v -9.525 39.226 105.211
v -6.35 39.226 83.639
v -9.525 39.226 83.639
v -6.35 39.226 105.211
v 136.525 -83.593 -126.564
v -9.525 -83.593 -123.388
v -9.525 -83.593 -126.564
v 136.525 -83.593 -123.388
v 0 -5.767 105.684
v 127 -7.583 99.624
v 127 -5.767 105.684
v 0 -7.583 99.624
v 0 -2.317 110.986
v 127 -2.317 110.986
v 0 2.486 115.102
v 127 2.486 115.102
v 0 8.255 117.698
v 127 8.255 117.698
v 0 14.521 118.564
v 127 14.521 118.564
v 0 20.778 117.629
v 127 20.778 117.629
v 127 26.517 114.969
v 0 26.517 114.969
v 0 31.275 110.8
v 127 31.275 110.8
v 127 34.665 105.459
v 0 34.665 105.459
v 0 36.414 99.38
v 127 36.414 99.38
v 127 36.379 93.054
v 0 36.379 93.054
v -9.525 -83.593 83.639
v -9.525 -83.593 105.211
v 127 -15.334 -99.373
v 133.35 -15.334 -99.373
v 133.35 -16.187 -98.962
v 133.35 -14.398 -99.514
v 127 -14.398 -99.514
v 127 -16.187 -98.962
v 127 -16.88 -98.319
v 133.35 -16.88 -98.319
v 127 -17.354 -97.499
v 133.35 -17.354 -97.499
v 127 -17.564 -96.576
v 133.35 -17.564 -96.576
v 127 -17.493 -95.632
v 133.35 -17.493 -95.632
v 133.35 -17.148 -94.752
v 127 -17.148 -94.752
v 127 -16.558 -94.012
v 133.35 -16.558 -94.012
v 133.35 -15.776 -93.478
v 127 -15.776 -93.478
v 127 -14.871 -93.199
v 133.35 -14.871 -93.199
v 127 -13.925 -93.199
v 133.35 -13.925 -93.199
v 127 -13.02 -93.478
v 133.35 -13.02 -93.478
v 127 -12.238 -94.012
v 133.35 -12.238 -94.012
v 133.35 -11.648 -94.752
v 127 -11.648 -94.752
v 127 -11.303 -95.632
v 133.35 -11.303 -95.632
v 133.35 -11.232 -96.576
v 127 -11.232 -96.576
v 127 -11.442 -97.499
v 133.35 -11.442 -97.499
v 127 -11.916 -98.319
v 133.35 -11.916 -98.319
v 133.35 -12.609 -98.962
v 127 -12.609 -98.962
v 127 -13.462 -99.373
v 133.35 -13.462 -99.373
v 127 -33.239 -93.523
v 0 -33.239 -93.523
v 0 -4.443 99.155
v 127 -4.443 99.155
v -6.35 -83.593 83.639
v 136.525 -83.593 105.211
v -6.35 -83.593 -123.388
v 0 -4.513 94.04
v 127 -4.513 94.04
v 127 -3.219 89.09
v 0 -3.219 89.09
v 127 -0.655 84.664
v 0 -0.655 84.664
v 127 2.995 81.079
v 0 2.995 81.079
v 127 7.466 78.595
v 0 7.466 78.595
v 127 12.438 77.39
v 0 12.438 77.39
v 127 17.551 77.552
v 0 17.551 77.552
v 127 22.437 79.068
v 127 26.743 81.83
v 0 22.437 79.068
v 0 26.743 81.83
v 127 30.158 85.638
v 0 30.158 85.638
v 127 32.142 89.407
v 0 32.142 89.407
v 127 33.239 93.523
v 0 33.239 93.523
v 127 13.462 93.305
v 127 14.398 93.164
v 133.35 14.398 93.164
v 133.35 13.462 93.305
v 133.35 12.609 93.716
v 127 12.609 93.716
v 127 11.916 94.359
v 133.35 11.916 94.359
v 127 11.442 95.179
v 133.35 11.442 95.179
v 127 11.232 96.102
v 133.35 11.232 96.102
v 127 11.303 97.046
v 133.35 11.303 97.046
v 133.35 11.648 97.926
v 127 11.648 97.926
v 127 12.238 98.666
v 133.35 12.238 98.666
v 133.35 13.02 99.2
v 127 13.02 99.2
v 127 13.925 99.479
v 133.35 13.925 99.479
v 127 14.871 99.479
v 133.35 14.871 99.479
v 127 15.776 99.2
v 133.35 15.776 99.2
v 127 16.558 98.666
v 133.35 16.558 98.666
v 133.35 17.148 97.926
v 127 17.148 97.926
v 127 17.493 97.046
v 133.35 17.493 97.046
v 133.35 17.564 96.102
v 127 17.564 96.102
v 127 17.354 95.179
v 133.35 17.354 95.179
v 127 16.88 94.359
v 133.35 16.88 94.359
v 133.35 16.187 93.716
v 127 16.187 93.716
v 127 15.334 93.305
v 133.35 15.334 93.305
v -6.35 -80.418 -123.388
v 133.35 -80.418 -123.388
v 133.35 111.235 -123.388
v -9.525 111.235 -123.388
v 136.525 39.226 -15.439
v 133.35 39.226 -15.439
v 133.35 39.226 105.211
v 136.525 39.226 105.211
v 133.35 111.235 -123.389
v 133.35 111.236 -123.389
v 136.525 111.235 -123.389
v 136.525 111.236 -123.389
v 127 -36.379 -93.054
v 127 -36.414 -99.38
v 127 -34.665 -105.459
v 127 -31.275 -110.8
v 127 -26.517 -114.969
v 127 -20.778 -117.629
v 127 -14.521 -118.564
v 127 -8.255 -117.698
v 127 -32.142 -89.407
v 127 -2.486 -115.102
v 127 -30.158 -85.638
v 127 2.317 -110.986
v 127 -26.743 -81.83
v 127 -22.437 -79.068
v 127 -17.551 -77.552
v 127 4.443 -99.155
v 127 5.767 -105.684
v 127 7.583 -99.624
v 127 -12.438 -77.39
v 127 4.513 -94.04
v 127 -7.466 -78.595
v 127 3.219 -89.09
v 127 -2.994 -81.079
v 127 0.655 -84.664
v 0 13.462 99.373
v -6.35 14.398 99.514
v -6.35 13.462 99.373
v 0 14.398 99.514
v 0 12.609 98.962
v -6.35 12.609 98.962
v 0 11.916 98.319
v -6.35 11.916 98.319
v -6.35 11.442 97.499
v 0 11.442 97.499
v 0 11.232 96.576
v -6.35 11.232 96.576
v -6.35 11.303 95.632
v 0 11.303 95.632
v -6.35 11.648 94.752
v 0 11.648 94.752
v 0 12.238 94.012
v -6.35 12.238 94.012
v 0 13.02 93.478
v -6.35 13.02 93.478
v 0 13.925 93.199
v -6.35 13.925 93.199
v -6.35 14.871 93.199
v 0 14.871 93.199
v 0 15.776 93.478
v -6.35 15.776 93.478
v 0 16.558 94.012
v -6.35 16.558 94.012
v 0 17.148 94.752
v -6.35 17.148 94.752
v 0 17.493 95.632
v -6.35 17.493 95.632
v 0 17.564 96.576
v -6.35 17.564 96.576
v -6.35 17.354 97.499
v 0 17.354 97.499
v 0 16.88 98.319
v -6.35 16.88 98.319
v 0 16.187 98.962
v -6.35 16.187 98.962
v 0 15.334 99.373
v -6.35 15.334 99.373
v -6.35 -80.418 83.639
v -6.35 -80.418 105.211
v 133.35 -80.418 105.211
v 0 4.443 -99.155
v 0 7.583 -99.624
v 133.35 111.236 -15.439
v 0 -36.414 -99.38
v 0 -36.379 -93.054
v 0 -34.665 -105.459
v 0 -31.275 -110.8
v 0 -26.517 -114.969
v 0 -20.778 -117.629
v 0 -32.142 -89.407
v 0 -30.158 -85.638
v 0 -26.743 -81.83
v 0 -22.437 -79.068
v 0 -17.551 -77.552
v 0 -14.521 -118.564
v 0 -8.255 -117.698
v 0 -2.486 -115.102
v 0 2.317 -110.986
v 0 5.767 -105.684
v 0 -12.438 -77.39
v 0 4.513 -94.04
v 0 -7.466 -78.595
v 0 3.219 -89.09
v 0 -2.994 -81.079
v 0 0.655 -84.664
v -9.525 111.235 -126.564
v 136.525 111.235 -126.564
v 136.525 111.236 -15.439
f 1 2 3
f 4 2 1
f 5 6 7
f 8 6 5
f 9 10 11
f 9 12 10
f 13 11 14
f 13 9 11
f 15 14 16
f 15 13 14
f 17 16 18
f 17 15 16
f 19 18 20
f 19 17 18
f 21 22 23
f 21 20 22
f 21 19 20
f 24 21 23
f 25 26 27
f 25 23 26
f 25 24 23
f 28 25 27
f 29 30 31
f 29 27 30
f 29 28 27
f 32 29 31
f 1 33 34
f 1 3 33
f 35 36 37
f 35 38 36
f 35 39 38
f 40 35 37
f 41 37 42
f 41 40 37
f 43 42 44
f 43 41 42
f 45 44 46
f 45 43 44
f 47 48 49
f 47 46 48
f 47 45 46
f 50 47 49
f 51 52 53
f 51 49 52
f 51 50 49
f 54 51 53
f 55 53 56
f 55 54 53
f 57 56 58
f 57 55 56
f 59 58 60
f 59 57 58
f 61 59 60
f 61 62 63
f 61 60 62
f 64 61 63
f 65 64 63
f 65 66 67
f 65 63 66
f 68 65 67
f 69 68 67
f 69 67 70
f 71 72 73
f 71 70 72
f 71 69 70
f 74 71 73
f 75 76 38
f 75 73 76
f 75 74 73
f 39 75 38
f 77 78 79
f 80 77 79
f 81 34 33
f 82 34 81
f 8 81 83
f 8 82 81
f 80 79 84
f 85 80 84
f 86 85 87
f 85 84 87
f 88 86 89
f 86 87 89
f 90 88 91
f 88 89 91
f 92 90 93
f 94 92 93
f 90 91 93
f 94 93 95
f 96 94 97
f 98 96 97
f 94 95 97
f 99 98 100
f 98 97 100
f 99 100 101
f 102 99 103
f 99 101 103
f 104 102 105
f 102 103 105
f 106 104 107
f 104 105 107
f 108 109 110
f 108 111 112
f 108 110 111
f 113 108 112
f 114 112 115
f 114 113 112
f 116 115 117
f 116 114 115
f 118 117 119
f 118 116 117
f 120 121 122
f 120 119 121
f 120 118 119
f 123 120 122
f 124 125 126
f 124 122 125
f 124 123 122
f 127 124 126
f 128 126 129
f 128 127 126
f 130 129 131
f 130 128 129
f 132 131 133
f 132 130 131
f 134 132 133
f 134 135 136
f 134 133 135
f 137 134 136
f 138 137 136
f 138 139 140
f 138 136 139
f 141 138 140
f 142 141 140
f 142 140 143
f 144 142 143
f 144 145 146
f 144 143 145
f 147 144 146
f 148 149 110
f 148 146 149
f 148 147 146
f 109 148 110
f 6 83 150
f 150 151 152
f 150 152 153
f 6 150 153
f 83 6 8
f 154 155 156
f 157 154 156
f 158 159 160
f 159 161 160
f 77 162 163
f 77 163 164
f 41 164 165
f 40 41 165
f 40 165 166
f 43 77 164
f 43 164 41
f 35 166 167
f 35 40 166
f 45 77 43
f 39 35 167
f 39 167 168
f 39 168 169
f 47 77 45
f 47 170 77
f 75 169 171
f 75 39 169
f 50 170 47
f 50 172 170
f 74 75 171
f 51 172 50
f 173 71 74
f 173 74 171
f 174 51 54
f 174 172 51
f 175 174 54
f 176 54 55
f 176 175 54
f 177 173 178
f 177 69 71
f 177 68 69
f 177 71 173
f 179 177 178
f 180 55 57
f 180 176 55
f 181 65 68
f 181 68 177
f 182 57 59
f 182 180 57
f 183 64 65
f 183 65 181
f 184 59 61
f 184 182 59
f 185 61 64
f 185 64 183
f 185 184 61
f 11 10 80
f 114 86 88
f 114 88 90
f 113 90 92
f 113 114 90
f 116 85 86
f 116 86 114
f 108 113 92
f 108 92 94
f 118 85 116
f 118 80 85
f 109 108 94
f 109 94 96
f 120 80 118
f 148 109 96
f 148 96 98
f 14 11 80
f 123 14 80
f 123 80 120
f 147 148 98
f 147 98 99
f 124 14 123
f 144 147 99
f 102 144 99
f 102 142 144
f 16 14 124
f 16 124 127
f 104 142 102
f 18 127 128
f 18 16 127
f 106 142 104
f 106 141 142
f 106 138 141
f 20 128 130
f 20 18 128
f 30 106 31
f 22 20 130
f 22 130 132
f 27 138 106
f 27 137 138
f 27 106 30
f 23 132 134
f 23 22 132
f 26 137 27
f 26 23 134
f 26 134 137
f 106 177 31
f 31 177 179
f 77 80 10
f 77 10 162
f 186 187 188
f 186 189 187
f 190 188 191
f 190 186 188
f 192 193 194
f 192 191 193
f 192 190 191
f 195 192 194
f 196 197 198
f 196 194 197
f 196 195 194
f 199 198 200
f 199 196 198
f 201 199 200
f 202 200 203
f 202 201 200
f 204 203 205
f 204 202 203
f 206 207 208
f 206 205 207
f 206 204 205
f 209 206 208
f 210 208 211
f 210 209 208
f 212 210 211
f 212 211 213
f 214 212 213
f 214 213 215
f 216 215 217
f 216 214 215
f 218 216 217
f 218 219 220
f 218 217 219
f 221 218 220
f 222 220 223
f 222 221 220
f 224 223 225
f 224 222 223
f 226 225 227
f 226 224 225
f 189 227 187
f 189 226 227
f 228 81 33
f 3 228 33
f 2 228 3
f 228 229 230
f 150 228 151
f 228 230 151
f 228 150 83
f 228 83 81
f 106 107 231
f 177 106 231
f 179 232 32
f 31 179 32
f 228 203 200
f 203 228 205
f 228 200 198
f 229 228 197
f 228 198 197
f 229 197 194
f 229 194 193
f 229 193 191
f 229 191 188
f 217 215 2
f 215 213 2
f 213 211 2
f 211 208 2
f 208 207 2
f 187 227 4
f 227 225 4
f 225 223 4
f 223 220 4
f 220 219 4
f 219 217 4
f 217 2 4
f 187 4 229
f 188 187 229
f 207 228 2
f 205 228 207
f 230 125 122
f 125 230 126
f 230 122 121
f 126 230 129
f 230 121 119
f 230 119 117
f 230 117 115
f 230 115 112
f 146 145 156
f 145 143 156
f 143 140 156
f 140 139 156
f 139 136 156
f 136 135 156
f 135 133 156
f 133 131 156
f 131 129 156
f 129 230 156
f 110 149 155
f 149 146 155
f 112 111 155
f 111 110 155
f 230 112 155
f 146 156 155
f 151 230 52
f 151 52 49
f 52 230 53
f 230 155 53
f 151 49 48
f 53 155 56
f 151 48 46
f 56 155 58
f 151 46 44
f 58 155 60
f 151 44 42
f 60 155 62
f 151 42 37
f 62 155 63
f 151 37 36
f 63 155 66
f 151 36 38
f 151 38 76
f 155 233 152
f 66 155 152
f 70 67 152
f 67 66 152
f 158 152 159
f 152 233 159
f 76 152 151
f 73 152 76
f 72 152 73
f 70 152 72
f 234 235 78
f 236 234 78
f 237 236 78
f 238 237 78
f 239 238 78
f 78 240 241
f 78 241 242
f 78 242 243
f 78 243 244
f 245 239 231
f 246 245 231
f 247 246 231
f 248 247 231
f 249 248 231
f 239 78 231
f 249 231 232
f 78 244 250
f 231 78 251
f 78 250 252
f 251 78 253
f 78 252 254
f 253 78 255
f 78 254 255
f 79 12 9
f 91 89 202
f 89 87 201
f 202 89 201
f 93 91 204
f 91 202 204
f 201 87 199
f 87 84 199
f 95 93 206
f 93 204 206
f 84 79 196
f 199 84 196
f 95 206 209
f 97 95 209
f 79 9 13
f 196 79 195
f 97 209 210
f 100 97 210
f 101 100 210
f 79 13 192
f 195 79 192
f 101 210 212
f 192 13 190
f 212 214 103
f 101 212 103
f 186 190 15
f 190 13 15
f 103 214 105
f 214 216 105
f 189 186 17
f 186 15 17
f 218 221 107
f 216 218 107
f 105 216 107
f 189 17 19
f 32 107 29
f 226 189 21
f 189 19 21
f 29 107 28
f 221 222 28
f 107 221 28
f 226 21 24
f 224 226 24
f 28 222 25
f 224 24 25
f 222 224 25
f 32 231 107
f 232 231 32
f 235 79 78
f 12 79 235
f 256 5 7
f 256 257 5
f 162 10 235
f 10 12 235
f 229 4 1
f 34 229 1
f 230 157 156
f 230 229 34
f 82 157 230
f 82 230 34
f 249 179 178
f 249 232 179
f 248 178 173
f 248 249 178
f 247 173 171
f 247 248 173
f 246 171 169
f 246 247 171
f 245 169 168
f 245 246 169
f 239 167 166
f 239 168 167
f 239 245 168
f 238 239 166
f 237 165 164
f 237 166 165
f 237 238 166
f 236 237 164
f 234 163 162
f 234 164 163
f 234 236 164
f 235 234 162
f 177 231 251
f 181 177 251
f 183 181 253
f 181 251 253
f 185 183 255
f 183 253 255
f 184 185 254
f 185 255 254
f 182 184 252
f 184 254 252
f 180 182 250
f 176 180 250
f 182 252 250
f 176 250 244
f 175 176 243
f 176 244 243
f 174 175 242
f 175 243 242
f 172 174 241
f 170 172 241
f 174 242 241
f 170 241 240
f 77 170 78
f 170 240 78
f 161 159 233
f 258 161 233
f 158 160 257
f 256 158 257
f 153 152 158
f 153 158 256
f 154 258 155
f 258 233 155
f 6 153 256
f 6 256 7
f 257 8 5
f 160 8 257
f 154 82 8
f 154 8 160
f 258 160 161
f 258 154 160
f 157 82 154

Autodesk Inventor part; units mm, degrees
ref_plane "YZ Plane" through (0, 0, 0) normal (1, 0, 0) x (0, 1, 0)
ref_plane "XZ Plane" through (0, 0, 0) normal (0, 1, 0) x (-1, 0, 0)
ref_plane "XY Plane" through (0, 0, 0) normal (0, 0, 1) x (1, 0, 0)
sketch "Sketch3" plane through (0, 0, 0) normal (1, 0, 0) x (0, 1, 0)
  line L0 (0, 0) -> (232.918, 0) construction
  line L1 (0, 0) -> (208.28, 0) construction
  line L2 (0, 0) -> (194.818, 0) construction
  line L3 (0, 0) -> (156.718, 0) construction
  line L4 (14.398, 96.339) -> (-14.398, -96.339) construction
  line L5 (-7.5829, 99.6241) -> (-36.3788, -93.054)
  line L6 (7.5829, -99.6241) -> (36.3788, 93.054)
  arc A0 (36.3788, 93.054) -> (-7.5829, 99.6241) centre (14.398, 96.339) ccw
  arc A1 (-36.3788, -93.054) -> (7.5829, -99.6241) centre (-14.398, -96.339) ccw
  line L7 (0, 0) -> (194.818, 0) construction
  line L8 (33.2387, 93.5233) -> (4.4428, -99.1548)
  arc A2 (-33.2387, -93.5233) -> (4.4428, -99.1548) centre (-14.398, -96.339) ccw
  line L9 (-33.2387, -93.5233) -> (-4.4428, 99.1548)
  arc A3 (33.2387, 93.5233) -> (-4.4428, 99.1548) centre (14.398, 96.339) ccw
  ellipse E0 centre (-14.398, -96.339) end of major axis (-17.2137, -115.1798) minor radius 19.05
  ellipse E1 centre (14.398, 96.339) end of major axis (33.2387, 93.5233) minor radius 19.05
  dimension "d23" = 97.409
  dimension "d24" = 98.5
  dimension "d25" = 44.45
  dimension "d26" = 3.175
extrude "Extrusion3" add sketch "Sketch3" along normal blind 127 contours A0 L6 A1 L5 | E1 A3 | A2 E0
sketch "Sketch4" plane through (127, 0, 0) normal (1, 0, 0) x (0, 0, -1)
  arc A0 (-99.1548, -4.4428) -> (-93.5233, 33.2387) centre (-96.339, 14.398) ccw projected
  circle A1 centre (-96.339, 14.398) radius 3.175
  line L0 (-96.339, 14.398) -> (96.339, -14.398) construction
  line L1 (-96.339, 14.398) -> (98.479, 14.398) construction
  circle A2 centre (96.339, -14.398) radius 3.175
  point P0 (0, 0)
  dimension "d27" = 6.35
  dimension "d28" = 194.818
  dimension "d29" = 8.5
  dimension "d30" = 6.35
extrude "Extrusion4" add sketch "Sketch4" along normal blind 6.35
sketch "Sketch5" plane through (133.35, 14.398, 96.339) normal (1, 0, 0) x (0, 0, -1)
  line L0 (219.7276, -97.9907) -> (219.7276, 96.8375)
  line L1 (219.7276, 96.8375) -> (-8.8724, 96.8375)
  line L2 (-8.8724, 96.8375) -> (-8.8724, -97.9907)
  line L3 (-8.8724, -97.9907) -> (219.7276, -97.9907)
  line L4 (219.7276, -97.9907) -> (414.5558, -97.9907) construction
  line L5 (-8.8724, 96.8375) -> (111.7776, 96.8375)
  line L6 (111.7776, 96.8375) -> (111.7776, 24.8285)
  line L7 (111.7776, 24.8285) -> (-8.8724, 24.8285)
  line L8 (-8.8724, 24.8285) -> (-8.8724, 96.8375)
  point P0 (96.339, -14.398)
  dimension "d33" = 90
  dimension "d34" = 228.6
  dimension "d50" = 120.65
  dimension "d51" = 72.009
extrude "Extrusion5" add sketch "Sketch5" along normal blind 3.175 contours L3 L2 L7 L6 L1 L0
sketch "Sketch6" plane through (133.35, 14.398, 96.339) normal (-1, 0, 0) x (0, 0, 1)
  line L0 (8.8724, -97.9907) -> (-219.7276, -97.9907) projected
  line L1 (-219.7276, -97.9907) -> (8.8724, -97.9907)
  line L2 (8.8724, -97.9907) -> (8.8724, -94.8157)
  line L3 (8.8724, -94.8157) -> (-219.7276, -94.8157)
  line L4 (-219.7276, -94.8157) -> (-219.7276, -97.9907)
  point P0 (-96.339, -14.398)
  dimension "d37" = 3.175
extrude "Extrusion6" add sketch "Sketch6" along normal blind 139.7
sketch "Sketch7" plane through (0, 0, 0) normal (-1, 0, 0) x (0, 0, 1)
  circle A0 centre (96.339, 14.398) radius 3.175 projected
  circle A1 centre (96.339, 14.398) radius 3.175
  point P0 (0, 0)
  dimension "d40" = 6.35
extrude "Extrusion7" add sketch "Sketch7" along normal blind 6.35
sketch "Sketch8" plane through (-6.35, 14.398, 96.339) normal (-1, 0, 0) x (0, 0, 1)
  arc A0 (3.2851, -21.9809) -> (-3.2851, 21.9809) centre (0, 0) ccw construction
  line L0 (0, 0) -> (0, 25.4) construction
  line L1 (0, 25.4) -> (12.7, 25.4) construction
  line L2 (12.7, 25.4) -> (-12.7, 25.4) construction
  line L3 (-12.7, 25.4) -> (-12.7, -97.9907) construction
  line L4 (-12.7, -97.9907) -> (12.7, -97.9907) construction
  line L5 (12.7, -97.9907) -> (12.7, 25.4) construction
  line L6 (8.8724, 24.8285) -> (8.8724, -94.8157) projected
  line L7 (8.8724, 25.4) -> (8.8724, -97.9907)
  line L8 (8.8724, -97.9907) -> (-12.7, -97.9907)
  line L9 (-12.7, -97.9907) -> (-12.7, 25.4)
  line L10 (-111.7776, 24.8285) -> (8.8724, 24.8285) projected
  line L11 (-12.7, 24.8285) -> (8.8724, 24.8285)
  line L12 (-12.7, 24.8285) -> (8.8724, 24.8285) construction
  point P0 (-96.339, -14.398)
  point P1 (8.8724, 96.8375)
  point P2 (8.8724, -94.8157)
  dimension "d43" = 25.4
  dimension "d44" = 12.7
  dimension "d45" = 25.4
  dimension "d52" = 0
extrude "Extrusion8" add sketch "Sketch8" along normal blind 3.175
sketch "Sketch9" plane through (136.525, -83.5928, -123.3885) normal (0, 0, -1) x (-1, 0, 0)
  point P0 (136.525, 83.5928)
sketch "Sketch10" plane through (136.525, -83.5928, -123.3885) normal (0, 0, -1) x (-1, 0, 0)
  line L0 (142.875, 0) -> (146.05, 0) projected
  line L1 (142.875, 0) -> (0, 0) projected
  line L2 (146.05, 0) -> (0, 0)
  line L3 (0, 0) -> (0, 194.8282)
  line L4 (0, 194.8282) -> (146.05, 194.8282)
  line L5 (146.05, 194.8282) -> (146.05, 0)
  point P0 (136.525, 83.5928)
extrude "Extrusion9" add sketch "Sketch10" along normal blind 3.175
properties part number "ShootingMech_Housing5"
